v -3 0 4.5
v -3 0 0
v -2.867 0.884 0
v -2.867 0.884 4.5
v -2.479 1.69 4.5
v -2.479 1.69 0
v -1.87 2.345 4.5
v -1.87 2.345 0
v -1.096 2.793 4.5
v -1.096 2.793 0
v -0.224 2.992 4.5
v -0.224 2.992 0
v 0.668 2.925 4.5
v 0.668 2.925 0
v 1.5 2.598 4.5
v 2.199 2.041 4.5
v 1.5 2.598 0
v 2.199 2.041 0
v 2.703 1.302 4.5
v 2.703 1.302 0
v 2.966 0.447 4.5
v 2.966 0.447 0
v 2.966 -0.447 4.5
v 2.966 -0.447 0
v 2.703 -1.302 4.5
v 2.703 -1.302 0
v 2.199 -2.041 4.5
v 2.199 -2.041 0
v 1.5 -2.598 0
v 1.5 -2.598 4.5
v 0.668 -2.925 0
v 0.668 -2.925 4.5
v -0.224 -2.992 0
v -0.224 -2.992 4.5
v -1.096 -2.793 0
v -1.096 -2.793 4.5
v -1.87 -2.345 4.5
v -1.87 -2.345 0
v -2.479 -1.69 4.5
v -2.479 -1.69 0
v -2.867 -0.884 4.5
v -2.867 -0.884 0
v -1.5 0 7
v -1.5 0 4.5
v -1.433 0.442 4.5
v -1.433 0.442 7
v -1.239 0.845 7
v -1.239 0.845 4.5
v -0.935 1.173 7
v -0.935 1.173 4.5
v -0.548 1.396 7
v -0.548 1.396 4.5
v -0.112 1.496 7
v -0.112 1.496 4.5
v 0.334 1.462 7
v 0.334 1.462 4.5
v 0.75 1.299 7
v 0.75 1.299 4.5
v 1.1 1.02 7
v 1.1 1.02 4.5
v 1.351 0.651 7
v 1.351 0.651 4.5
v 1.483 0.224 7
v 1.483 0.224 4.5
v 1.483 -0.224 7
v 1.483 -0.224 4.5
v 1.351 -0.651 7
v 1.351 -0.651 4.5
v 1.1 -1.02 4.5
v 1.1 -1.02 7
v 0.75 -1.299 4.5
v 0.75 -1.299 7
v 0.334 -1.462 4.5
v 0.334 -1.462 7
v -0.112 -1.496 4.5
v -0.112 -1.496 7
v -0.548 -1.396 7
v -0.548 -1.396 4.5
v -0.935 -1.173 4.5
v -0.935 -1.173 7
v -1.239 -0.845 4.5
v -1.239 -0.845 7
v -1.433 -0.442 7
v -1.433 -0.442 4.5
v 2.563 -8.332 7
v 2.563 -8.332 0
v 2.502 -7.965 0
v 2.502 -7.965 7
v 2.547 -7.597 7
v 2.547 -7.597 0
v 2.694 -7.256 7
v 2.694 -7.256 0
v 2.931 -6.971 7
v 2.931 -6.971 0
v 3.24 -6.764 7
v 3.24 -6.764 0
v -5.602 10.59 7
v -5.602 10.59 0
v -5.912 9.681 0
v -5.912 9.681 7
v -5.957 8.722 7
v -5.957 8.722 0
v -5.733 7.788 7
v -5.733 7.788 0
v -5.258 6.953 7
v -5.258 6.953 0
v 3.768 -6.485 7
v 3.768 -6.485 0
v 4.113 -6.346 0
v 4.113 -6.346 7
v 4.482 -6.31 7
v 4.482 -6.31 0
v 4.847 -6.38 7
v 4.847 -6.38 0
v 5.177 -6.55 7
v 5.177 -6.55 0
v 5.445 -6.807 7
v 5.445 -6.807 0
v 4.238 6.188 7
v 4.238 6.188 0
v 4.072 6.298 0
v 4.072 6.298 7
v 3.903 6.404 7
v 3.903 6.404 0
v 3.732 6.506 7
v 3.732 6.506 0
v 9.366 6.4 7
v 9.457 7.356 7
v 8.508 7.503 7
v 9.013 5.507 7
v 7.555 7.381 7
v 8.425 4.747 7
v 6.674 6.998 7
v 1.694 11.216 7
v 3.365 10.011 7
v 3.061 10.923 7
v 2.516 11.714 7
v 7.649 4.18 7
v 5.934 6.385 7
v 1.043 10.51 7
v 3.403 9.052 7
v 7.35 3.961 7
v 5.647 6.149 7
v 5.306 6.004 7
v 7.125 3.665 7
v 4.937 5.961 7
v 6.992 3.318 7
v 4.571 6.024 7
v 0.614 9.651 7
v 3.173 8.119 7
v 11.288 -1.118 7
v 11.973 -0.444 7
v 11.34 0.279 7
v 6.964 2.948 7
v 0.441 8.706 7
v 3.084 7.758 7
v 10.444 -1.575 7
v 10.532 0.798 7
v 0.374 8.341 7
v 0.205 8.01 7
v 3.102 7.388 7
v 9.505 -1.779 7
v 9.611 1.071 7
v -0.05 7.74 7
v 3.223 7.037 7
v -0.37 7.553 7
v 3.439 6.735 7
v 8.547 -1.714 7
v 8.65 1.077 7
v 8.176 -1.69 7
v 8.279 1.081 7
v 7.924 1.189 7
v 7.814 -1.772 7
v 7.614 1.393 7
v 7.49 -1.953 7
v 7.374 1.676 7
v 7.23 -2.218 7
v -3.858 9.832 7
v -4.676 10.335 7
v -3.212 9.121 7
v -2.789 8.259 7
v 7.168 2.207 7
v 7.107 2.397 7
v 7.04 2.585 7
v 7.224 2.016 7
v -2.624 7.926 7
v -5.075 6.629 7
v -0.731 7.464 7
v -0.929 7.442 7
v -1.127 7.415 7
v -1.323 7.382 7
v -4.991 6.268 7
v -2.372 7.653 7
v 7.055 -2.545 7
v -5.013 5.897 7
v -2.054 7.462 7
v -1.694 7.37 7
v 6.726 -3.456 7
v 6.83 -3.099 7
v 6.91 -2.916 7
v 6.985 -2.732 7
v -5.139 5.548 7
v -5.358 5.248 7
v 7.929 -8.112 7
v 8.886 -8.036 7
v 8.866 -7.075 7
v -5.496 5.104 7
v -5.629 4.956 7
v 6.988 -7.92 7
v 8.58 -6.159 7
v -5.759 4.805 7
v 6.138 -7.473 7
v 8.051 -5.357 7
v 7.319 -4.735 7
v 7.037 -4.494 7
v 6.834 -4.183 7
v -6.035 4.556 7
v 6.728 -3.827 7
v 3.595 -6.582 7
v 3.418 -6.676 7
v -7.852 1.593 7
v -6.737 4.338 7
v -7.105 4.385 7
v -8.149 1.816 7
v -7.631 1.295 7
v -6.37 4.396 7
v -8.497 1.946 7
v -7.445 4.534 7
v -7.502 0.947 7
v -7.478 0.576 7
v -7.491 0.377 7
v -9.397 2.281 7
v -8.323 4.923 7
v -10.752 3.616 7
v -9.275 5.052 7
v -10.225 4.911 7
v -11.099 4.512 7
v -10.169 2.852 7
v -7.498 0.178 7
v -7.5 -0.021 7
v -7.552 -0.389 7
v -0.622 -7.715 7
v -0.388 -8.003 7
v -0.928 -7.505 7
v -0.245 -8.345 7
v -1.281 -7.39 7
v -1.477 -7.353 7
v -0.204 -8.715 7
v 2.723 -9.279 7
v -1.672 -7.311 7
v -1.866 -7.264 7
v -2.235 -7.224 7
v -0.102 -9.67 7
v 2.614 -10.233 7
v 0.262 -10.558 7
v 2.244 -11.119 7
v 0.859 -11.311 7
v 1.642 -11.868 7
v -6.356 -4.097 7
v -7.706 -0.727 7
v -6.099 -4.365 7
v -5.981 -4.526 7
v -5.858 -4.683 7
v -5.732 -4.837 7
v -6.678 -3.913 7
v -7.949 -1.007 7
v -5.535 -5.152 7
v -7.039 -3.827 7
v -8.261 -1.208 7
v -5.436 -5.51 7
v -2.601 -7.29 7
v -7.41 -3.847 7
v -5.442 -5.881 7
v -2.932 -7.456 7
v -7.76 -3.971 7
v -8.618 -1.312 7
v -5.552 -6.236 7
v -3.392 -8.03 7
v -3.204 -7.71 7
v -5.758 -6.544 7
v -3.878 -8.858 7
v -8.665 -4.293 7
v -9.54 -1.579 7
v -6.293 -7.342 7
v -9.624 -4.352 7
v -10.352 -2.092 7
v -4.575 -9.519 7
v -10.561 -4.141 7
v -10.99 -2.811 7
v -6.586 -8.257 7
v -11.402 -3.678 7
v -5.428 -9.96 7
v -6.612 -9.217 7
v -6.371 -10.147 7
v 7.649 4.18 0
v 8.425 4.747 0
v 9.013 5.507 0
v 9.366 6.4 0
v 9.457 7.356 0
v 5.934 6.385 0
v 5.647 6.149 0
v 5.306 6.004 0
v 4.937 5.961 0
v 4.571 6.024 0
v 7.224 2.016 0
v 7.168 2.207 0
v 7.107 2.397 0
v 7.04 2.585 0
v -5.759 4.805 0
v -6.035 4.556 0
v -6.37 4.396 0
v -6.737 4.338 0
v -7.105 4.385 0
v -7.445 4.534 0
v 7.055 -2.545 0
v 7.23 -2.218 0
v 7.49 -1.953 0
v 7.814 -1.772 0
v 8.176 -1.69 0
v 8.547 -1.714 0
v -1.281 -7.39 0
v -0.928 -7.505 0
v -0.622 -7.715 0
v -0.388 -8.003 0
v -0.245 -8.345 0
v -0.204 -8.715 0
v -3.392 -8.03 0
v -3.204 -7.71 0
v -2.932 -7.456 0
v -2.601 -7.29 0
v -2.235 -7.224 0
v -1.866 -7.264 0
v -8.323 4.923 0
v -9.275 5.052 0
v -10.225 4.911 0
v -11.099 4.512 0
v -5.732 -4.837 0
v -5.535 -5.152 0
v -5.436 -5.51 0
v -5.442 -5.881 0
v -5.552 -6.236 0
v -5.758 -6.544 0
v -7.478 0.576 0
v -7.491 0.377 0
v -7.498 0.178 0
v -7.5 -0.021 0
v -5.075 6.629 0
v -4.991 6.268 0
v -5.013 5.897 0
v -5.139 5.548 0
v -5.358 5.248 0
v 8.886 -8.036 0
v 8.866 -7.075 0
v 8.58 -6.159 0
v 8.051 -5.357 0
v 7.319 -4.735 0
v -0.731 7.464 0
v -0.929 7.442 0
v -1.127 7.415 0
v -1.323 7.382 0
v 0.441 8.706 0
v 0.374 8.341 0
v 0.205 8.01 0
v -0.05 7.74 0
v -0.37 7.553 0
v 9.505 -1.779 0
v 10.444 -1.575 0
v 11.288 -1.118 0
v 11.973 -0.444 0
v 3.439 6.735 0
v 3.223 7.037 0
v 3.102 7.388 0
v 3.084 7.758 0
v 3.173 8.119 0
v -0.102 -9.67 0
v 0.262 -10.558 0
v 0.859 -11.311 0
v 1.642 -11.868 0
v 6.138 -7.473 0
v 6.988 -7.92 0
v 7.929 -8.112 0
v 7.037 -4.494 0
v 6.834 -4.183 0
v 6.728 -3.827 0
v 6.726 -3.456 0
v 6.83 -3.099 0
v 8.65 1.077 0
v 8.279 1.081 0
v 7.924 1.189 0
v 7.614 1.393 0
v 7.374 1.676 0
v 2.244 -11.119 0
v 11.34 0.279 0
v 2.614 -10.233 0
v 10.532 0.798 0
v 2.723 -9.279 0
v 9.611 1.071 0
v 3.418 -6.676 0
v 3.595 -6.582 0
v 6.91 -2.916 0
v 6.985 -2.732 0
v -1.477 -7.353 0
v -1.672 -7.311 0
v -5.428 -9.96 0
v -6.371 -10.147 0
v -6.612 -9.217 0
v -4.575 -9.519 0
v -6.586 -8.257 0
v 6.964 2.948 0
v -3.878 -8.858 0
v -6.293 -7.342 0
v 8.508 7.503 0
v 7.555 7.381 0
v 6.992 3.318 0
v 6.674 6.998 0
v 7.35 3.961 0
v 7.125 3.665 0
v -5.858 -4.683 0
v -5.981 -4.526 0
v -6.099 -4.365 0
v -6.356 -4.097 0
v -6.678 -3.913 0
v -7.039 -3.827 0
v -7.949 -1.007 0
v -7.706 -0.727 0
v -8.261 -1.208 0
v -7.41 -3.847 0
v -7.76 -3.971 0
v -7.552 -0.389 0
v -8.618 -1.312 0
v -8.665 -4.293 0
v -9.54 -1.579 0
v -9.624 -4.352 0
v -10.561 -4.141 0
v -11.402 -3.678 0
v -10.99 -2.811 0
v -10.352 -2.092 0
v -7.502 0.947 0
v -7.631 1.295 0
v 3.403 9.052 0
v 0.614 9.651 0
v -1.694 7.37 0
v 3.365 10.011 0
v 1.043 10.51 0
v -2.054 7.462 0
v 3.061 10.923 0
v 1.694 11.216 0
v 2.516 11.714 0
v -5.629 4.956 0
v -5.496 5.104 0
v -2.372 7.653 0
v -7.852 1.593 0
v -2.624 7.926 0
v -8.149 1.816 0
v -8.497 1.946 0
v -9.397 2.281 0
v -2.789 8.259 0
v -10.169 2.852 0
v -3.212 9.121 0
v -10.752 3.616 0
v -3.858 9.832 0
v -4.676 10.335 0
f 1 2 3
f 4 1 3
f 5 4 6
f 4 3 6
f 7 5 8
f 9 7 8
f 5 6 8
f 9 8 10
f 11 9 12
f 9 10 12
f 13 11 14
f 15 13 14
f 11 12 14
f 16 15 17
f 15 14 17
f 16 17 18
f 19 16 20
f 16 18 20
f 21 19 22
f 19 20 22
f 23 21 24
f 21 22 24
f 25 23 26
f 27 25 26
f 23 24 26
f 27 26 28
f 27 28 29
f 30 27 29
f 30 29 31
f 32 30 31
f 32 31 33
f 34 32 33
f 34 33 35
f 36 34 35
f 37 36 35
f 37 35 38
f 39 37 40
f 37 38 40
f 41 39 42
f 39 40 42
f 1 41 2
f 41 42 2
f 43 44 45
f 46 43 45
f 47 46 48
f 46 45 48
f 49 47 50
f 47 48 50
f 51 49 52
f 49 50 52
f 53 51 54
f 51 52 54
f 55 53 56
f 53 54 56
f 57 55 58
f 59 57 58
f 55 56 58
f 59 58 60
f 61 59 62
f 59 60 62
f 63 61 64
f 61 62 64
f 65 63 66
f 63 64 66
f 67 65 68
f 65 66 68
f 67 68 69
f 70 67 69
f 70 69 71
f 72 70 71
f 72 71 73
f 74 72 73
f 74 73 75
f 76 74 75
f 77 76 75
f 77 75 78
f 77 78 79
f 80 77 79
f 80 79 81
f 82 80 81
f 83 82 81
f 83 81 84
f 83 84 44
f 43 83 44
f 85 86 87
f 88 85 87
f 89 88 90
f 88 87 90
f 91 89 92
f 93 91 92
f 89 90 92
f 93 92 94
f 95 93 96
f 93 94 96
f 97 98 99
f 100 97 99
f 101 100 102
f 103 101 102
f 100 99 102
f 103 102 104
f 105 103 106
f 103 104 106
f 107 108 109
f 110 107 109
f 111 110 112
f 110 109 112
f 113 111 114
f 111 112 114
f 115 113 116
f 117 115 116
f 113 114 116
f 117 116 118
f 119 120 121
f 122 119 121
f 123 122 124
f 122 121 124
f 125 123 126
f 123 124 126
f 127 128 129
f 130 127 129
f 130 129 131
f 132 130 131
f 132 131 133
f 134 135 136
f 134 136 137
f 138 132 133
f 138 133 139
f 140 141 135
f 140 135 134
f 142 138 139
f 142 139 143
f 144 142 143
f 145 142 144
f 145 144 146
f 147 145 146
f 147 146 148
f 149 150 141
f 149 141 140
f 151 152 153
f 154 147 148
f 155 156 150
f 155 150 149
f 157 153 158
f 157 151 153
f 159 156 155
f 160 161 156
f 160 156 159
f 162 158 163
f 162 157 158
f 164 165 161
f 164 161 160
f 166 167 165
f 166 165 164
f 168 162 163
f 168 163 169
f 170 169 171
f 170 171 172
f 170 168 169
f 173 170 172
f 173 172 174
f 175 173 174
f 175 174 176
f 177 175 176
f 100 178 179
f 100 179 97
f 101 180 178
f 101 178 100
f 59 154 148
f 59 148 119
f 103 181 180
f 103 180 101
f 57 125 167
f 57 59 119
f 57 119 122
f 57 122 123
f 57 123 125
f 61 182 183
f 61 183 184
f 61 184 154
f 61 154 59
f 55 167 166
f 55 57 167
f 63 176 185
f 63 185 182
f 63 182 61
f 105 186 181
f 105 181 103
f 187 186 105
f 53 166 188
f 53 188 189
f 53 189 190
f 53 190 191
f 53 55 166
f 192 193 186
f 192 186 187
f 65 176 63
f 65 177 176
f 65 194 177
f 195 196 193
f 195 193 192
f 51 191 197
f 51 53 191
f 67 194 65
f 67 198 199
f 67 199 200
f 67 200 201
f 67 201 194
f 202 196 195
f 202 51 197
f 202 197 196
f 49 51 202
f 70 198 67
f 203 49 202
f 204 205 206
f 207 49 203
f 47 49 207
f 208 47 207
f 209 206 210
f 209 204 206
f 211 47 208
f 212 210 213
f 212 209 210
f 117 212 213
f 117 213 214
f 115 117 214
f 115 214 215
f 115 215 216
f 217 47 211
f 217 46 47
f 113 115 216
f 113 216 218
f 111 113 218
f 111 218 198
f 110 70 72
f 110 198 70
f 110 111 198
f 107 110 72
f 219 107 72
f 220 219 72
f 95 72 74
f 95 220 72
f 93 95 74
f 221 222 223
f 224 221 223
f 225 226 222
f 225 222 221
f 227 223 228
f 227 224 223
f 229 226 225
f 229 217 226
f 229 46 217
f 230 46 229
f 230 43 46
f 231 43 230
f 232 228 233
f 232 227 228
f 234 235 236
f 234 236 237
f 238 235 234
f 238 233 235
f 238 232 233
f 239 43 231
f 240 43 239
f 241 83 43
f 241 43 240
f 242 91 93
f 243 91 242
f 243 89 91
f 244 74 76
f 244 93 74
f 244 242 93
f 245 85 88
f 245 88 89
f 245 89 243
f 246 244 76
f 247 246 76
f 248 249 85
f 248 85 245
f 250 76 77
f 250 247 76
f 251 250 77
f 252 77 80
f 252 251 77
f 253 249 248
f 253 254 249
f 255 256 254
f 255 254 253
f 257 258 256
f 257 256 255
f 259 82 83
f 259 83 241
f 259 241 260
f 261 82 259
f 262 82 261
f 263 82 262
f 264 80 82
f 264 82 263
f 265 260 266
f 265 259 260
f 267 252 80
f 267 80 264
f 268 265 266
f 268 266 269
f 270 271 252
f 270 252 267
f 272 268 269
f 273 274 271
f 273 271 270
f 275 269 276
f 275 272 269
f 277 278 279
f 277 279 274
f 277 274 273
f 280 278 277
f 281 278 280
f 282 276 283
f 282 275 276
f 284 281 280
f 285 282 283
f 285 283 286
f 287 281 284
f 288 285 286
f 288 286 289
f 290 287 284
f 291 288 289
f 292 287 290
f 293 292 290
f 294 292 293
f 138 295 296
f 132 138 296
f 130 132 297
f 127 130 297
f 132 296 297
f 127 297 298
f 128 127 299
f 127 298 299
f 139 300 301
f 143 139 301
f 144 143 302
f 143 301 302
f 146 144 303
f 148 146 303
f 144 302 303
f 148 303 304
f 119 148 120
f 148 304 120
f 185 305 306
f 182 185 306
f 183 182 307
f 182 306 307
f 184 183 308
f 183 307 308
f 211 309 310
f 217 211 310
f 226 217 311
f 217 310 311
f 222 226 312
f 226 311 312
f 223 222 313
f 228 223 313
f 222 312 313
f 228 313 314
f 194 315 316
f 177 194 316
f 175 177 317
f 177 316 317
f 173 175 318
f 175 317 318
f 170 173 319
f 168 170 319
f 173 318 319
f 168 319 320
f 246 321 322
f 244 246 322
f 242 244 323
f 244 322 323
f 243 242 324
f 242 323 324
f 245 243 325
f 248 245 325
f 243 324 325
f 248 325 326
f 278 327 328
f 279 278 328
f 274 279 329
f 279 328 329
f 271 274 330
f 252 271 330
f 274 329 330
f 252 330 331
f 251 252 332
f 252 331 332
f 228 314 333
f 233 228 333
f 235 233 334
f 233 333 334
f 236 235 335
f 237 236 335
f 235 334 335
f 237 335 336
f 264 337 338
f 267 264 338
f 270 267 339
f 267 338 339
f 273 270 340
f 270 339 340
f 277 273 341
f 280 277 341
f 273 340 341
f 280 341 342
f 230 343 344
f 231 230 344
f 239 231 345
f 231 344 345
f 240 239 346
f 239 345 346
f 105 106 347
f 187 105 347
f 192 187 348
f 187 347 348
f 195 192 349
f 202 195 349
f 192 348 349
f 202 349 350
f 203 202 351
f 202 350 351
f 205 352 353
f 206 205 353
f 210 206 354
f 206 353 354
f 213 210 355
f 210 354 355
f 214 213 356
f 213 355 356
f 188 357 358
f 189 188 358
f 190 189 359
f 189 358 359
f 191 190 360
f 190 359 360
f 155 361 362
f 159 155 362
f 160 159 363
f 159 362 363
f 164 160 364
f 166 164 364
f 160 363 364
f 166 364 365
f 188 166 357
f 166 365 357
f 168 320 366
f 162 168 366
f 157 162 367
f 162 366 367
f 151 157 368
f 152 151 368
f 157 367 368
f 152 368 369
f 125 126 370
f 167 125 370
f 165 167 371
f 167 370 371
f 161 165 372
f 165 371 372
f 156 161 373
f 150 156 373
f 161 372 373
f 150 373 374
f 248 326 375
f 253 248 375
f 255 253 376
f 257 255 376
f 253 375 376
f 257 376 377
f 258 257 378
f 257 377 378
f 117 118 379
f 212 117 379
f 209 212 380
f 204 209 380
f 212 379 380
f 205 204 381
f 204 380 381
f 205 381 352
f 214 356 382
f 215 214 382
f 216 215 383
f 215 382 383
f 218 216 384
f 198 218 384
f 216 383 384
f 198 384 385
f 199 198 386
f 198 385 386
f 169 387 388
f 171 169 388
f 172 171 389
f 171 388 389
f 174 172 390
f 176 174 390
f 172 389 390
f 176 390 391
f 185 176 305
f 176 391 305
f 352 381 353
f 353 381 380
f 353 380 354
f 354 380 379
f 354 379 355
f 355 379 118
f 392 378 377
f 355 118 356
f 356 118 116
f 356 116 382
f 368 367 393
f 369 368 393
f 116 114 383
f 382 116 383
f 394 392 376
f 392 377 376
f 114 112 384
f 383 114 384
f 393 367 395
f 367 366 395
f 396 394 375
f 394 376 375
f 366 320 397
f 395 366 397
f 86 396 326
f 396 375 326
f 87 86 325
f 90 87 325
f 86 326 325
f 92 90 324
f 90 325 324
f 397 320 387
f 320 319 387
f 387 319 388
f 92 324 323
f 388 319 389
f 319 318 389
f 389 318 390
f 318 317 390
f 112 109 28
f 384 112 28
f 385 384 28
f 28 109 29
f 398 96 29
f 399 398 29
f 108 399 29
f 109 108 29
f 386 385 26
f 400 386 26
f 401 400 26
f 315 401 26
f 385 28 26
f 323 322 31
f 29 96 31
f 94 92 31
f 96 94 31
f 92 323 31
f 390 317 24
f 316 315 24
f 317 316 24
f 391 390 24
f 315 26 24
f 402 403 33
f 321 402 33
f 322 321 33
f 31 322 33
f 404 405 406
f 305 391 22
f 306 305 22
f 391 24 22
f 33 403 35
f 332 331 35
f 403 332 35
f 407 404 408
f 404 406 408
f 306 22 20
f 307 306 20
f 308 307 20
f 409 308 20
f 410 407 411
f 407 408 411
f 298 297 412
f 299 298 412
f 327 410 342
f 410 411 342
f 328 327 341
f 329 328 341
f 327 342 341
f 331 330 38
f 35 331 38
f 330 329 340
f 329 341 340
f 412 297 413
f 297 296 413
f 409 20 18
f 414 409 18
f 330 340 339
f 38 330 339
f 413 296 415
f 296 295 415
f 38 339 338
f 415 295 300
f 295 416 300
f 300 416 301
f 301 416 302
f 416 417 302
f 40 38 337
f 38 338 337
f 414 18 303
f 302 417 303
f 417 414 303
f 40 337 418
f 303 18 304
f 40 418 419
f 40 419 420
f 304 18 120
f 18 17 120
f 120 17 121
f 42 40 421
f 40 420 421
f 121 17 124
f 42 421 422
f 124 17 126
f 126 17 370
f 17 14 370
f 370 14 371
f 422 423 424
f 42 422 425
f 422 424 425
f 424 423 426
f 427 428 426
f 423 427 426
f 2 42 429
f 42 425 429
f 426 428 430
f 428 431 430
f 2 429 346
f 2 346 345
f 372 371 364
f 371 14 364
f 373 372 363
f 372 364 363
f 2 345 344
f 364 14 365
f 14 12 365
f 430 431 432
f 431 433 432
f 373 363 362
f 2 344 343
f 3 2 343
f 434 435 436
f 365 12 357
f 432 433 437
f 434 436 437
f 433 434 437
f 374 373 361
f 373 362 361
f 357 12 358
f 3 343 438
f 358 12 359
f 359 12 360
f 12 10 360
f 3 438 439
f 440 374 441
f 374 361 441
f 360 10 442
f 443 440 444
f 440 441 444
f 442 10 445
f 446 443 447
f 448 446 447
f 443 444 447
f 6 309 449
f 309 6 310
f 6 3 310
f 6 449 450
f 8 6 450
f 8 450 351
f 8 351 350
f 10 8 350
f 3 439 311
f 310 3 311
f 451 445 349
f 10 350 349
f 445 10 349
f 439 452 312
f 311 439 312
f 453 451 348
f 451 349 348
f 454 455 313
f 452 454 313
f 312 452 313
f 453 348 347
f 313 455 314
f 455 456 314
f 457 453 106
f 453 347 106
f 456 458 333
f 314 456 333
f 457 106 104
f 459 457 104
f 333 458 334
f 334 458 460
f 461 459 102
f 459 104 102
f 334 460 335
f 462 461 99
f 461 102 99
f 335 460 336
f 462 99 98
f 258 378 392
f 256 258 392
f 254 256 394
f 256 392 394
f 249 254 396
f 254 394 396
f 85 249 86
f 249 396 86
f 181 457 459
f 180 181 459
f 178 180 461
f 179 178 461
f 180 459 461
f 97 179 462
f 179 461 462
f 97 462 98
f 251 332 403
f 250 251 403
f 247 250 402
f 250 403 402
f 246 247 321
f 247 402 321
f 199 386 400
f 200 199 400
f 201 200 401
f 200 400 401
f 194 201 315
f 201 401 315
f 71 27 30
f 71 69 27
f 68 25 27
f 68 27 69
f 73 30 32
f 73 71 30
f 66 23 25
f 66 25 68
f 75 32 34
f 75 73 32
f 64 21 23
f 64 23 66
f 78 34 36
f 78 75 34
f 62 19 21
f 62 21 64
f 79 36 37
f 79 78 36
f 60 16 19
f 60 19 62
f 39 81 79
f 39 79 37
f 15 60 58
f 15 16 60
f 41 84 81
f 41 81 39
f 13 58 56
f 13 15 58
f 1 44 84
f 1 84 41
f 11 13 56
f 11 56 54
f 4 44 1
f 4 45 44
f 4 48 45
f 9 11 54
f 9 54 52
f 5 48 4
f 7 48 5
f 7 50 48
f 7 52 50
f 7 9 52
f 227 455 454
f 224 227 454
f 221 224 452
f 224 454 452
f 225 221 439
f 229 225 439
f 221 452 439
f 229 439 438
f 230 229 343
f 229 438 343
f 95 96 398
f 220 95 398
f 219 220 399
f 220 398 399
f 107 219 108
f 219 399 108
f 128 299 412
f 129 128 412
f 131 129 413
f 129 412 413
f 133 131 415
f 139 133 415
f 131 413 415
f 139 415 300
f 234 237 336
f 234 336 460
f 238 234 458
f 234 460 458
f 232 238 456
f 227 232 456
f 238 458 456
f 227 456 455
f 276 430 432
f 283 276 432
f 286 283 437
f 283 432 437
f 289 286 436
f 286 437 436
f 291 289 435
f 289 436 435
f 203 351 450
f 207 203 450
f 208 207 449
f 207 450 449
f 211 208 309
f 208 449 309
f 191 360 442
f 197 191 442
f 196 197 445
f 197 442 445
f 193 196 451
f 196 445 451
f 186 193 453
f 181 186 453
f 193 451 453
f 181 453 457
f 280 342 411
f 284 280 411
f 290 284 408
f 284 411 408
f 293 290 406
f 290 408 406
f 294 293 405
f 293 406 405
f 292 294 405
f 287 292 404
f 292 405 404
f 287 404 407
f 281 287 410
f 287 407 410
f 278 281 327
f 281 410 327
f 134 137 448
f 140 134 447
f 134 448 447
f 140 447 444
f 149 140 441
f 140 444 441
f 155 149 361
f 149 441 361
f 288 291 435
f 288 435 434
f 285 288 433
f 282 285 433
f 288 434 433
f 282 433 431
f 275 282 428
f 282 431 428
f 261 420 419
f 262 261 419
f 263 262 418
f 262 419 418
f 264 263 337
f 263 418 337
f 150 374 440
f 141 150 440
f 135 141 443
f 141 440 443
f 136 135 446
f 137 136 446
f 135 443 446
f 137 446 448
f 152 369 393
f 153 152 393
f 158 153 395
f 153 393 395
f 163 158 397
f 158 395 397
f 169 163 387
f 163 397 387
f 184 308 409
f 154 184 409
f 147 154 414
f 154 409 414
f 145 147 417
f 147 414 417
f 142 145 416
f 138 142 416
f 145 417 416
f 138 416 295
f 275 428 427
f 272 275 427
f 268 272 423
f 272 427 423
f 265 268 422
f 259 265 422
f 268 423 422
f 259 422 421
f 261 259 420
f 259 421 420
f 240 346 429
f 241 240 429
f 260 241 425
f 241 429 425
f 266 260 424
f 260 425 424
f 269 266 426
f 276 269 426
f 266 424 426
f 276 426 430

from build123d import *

# Parameters (mm, degrees)
CROQUIS1_R              = 12
CROQUIS1_R_2            = 10
CROQUIS1_R_3            = 3
CROQUIS1_R_4            = 1.5
SALIENTE_EXTRUIR1_DEPTH = 7
CORTAR_EXTRUIR2_DEPTH   = 7
MATRIZC2_COUNT          = 9
CROQUIS3_R              = 1.5
CORTAR_EXTRUIR3_DEPTH   = 7
CROQUIS7_R              = 3
CORTAR_EXTRUIR4_DEPTH   = 4.5


with BuildPart() as part:
    # Croquis1 → Saliente-Extruir1 (new body)
    # profile 1 of 4: a face of its own
    with BuildSketch(Plane(origin=(0, 0, 0), x_dir=(0, 1, 0), z_dir=(0, 0, 1))):
        with Locations(Location((0, 0, 0), (0, 0, 90))):
            Circle(CROQUIS1_R)
        Circle(CROQUIS1_R_2, mode=Mode.SUBTRACT)
    # profile 2 of 4: a face of its own
    with BuildSketch(Plane(origin=(0, 0, 0), x_dir=(0, 1, 0), z_dir=(0, 0, 1))):
        Circle(CROQUIS1_R_2)
        Circle(CROQUIS1_R_3, mode=Mode.SUBTRACT)
    # profile 3 of 4: a face of its own
    with BuildSketch(Plane(origin=(0, 0, 0), x_dir=(0, 1, 0), z_dir=(0, 0, 1))):
        Circle(CROQUIS1_R_3)
        Circle(CROQUIS1_R_4, mode=Mode.SUBTRACT)
    # profile 4 of 4: a face of its own
    with BuildSketch(Plane(origin=(0, 0, 0), x_dir=(0, 1, 0), z_dir=(0, 0, 1))):
        Circle(CROQUIS1_R_4)
    extrude(amount=SALIENTE_EXTRUIR1_DEPTH)

    # Croquis2 → Cortar-Extruir2 (cut)
    with BuildSketch(Plane(origin=(0, 0, 0), x_dir=(-1, 0, 0), z_dir=(0, 0, -1))):
        with BuildLine():
            ThreePointArc((-1.671726175, -11.882984961), (2.52, -11.732416631), (6.40384449, -10.148437108))
            ThreePointArc((6.40384449, -10.148437108), (4.588589795, -9.529007631), (3.392213046, -8.029832803))
            ThreePointArc((3.392213046, -8.029832803), (2.772460995, -7.361306204), (1.866050022, -7.264148767))
            ThreePointArc((1.866050022, -7.264148767), (1.575, -7.332760394), (1.281446283, -7.389715517))
            ThreePointArc((1.281446283, -7.389715517), (0.494876961, -7.850507358), (0.204307181, -8.714561536))
            ThreePointArc((0.204307181, -8.714561536), (-0.270936109, -10.57278281), (-1.671726175, -11.882984961))
        make_face()
    cortar_extruir2 = extrude(amount=-CORTAR_EXTRUIR2_DEPTH, mode=Mode.SUBTRACT)

    # MatrizC2: Cortar-Extruir2 ×9 about axis
    matrizc2_axis = Axis((0, 0, 0), (0, 0, 1))
    for i in range(1, MATRIZC2_COUNT):
        add(cortar_extruir2.rotate(matrizc2_axis, i * 360 / MATRIZC2_COUNT), mode=Mode.SUBTRACT)

    # Croquis3 → Cortar-Extruir3 (cut)
    with BuildSketch(Plane(origin=(0, 0, 0), x_dir=(-1, 0, 0), z_dir=(0, 0, -1))):
        Circle(CROQUIS3_R)
    extrude(amount=-CORTAR_EXTRUIR3_DEPTH, mode=Mode.SUBTRACT)

    # Croquis7 → Cortar-Extruir4 (cut)
    with BuildSketch(Plane(origin=(0, 0, 0), x_dir=(-1, 0, 0), z_dir=(0, 0, -1))):
        Circle(CROQUIS7_R)
    extrude(amount=-CORTAR_EXTRUIR4_DEPTH, mode=Mode.SUBTRACT)


solid = part.part
